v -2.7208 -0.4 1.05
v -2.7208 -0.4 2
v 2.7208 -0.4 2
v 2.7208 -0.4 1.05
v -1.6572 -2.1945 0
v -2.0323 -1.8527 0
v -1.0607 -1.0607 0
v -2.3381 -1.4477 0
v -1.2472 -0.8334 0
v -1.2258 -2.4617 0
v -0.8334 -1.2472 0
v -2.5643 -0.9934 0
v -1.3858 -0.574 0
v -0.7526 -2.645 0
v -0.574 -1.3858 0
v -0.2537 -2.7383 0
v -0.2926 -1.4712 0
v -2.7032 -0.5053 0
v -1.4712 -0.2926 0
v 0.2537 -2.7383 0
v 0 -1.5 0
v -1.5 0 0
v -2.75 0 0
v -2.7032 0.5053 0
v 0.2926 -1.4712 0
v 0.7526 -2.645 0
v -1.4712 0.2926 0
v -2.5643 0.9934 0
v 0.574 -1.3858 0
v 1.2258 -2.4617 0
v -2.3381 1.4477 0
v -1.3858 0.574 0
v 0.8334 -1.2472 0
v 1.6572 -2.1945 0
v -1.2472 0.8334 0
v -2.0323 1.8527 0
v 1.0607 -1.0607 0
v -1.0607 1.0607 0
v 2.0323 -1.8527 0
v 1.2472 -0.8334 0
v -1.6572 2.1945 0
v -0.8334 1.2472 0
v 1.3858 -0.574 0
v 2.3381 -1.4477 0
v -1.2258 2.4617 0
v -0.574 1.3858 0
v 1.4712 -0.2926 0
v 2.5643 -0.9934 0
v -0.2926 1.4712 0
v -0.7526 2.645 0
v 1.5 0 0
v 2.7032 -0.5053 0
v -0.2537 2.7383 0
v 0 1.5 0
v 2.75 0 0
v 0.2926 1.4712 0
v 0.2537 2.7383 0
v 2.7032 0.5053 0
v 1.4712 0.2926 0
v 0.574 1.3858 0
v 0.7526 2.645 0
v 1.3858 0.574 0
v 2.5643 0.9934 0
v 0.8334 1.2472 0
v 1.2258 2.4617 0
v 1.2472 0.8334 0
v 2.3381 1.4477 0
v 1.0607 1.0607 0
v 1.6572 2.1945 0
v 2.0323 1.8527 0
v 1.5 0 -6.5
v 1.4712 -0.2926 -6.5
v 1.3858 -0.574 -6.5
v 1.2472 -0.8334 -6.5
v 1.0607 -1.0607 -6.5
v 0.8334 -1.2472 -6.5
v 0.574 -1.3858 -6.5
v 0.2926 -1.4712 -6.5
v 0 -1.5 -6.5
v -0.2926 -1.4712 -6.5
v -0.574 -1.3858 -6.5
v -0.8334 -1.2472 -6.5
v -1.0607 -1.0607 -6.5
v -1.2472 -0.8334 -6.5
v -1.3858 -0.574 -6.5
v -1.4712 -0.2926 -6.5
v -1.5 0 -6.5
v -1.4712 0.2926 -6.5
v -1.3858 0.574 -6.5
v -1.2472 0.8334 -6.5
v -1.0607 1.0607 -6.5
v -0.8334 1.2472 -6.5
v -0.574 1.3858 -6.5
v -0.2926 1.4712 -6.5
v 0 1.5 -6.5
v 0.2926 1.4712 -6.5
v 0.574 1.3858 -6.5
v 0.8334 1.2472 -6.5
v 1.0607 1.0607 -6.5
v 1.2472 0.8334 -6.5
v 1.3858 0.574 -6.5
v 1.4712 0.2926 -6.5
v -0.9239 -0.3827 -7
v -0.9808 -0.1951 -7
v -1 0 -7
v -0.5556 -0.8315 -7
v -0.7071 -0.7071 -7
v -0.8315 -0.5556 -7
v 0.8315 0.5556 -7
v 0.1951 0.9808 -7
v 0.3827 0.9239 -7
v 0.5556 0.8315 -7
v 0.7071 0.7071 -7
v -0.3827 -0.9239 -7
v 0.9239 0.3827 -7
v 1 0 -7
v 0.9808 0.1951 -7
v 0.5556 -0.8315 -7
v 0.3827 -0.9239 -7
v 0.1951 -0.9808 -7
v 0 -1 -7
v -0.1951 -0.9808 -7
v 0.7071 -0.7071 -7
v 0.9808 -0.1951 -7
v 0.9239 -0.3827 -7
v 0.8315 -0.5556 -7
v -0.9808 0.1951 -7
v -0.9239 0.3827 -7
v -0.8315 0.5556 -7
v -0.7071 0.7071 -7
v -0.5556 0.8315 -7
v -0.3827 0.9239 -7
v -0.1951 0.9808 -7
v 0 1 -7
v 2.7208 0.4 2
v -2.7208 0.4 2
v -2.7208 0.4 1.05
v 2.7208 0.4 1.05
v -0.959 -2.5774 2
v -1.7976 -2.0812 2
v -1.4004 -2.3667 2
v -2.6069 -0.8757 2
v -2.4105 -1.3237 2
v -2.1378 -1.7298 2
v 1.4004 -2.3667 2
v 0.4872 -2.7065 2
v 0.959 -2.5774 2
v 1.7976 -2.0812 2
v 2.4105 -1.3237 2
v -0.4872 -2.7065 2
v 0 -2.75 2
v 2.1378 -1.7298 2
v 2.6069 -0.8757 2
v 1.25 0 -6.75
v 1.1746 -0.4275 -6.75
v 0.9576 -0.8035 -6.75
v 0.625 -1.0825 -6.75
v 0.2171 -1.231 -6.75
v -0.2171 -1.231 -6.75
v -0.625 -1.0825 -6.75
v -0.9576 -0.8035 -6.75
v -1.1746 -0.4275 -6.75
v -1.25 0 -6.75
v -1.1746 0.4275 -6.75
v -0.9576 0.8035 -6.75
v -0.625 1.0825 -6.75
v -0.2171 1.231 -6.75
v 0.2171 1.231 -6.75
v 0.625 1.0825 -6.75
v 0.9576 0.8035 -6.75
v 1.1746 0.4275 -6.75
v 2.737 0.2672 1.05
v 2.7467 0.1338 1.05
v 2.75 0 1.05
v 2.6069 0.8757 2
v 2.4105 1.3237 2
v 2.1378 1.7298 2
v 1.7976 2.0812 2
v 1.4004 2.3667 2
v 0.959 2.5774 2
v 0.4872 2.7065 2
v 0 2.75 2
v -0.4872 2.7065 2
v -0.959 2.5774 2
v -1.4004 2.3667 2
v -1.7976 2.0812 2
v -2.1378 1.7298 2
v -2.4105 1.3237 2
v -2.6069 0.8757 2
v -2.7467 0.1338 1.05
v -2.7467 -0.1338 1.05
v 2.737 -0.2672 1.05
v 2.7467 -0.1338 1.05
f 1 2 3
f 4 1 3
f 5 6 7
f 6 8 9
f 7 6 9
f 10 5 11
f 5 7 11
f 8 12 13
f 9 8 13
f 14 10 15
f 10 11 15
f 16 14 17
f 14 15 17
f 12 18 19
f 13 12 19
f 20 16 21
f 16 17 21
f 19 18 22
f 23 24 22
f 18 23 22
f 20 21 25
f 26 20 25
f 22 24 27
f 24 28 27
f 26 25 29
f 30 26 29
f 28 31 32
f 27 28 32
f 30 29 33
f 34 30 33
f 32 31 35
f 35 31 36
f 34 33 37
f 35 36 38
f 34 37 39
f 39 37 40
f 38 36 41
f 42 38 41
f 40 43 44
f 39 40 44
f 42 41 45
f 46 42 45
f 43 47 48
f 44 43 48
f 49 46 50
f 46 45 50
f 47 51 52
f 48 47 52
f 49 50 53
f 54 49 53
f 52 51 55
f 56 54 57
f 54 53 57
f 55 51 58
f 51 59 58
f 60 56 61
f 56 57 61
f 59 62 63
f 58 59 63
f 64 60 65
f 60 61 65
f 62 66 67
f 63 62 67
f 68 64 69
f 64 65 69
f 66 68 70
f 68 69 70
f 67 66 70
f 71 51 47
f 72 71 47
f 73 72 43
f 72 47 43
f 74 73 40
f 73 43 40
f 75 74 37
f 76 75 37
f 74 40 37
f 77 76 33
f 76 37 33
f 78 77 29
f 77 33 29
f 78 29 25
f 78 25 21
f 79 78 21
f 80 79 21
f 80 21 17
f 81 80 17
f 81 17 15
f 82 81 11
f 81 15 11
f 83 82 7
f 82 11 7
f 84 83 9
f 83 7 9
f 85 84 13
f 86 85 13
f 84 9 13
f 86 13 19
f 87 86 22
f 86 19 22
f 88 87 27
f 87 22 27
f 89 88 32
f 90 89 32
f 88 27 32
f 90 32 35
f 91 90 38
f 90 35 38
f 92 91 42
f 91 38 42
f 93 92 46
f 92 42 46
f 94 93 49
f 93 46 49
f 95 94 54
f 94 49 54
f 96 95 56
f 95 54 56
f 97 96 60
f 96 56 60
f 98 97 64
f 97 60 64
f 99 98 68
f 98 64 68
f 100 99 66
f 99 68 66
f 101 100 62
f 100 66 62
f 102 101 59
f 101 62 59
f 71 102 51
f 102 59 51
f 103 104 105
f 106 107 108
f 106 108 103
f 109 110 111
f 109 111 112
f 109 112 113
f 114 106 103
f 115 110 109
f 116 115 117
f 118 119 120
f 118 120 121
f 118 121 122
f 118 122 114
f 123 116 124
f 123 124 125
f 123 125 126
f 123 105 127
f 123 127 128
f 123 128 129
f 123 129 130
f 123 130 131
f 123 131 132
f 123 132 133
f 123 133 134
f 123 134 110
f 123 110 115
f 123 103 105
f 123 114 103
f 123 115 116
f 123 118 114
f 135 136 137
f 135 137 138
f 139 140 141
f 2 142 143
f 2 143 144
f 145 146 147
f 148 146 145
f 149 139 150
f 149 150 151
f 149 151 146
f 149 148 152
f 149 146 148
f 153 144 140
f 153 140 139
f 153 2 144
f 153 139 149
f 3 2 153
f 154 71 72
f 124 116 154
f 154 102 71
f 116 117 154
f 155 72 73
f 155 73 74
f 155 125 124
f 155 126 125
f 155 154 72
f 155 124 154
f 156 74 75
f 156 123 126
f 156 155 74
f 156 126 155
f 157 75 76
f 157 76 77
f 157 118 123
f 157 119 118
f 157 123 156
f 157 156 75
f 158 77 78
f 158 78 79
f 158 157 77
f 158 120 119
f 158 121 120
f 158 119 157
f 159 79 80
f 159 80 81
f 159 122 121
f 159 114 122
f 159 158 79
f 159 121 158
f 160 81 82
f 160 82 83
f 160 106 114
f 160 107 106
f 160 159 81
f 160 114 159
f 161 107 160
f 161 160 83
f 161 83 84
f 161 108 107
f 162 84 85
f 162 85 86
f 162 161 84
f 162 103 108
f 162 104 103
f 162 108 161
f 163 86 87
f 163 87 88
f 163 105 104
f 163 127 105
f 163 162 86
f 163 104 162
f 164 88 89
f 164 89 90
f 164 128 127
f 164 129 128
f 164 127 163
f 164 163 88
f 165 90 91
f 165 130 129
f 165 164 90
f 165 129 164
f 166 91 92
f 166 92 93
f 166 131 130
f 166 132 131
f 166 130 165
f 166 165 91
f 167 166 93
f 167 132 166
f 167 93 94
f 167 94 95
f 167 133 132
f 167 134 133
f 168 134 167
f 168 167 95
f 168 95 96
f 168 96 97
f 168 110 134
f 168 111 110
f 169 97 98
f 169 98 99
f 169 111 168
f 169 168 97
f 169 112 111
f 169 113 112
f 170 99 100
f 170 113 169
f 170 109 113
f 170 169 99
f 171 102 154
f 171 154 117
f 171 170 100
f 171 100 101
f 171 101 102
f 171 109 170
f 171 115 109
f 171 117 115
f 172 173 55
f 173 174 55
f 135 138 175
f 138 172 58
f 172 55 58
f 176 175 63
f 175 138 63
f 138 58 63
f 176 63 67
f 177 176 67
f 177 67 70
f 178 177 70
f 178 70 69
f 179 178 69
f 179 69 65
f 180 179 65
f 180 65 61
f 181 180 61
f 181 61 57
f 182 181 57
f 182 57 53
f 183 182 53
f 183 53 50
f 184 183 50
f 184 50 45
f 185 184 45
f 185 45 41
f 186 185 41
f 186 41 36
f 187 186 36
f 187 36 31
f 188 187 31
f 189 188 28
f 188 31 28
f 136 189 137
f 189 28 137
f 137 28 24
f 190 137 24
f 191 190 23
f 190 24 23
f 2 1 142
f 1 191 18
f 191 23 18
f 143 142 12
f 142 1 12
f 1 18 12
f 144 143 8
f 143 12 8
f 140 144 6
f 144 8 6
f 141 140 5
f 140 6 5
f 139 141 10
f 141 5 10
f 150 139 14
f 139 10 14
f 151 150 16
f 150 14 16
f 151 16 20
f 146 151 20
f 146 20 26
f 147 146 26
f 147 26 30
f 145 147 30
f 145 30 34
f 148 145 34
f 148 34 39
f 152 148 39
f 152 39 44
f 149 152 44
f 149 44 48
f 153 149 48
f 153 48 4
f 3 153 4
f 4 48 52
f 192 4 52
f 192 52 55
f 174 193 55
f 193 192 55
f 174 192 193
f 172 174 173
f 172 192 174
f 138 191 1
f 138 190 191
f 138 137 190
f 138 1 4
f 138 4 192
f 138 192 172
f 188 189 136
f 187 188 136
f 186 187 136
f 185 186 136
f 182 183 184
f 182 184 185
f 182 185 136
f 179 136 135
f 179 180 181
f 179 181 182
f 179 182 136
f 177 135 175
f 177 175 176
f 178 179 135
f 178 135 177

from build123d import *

# Parameters (mm, degrees)
SKETCH_12_R         = 2.75
EXTRUDE_3_DEPTH     = 2
SKETCH_13_R         = 1.5
EXTRUDE_4_DEPTH     = 7
SKETCH_20_W         = 6.034936197
SKETCH_20_H         = 0.8
CUT_EXTRUDE_8_DEPTH = 0.95
CHAMFER_1_SIZE      = 0.5


with BuildPart() as part:
    # Эскиз12 → Вытянуть3 (new body)
    with BuildSketch(Plane.XY):
        Circle(SKETCH_12_R)
    extrude(amount=EXTRUDE_3_DEPTH)

    # Эскиз13 → Вытянуть4 (add)
    with BuildSketch(Plane(origin=(0, 0, 0), x_dir=(-1, 0, 0), z_dir=(0, 0, -1))):
        with Locations(Location((0, 0, 0), (0, 0, 180))):
            Circle(SKETCH_13_R)
    extrude(amount=EXTRUDE_4_DEPTH)

    # Эскиз20 → Вырез-Вытянуть8 (cut)
    with BuildSketch(Plane.XY.offset(2)):
        with Locations((-0.014122315, 0)):
            Rectangle(SKETCH_20_W, SKETCH_20_H)
    extrude(amount=-CUT_EXTRUDE_8_DEPTH, mode=Mode.SUBTRACT)

    # Фаска1
    chamfer_1_edges = [part.edges().sort_by_distance(p)[0] for p in [
        (-1.5, 0, -7),
    ]]
    chamfer(chamfer_1_edges, length=CHAMFER_1_SIZE)


solid = part.part
